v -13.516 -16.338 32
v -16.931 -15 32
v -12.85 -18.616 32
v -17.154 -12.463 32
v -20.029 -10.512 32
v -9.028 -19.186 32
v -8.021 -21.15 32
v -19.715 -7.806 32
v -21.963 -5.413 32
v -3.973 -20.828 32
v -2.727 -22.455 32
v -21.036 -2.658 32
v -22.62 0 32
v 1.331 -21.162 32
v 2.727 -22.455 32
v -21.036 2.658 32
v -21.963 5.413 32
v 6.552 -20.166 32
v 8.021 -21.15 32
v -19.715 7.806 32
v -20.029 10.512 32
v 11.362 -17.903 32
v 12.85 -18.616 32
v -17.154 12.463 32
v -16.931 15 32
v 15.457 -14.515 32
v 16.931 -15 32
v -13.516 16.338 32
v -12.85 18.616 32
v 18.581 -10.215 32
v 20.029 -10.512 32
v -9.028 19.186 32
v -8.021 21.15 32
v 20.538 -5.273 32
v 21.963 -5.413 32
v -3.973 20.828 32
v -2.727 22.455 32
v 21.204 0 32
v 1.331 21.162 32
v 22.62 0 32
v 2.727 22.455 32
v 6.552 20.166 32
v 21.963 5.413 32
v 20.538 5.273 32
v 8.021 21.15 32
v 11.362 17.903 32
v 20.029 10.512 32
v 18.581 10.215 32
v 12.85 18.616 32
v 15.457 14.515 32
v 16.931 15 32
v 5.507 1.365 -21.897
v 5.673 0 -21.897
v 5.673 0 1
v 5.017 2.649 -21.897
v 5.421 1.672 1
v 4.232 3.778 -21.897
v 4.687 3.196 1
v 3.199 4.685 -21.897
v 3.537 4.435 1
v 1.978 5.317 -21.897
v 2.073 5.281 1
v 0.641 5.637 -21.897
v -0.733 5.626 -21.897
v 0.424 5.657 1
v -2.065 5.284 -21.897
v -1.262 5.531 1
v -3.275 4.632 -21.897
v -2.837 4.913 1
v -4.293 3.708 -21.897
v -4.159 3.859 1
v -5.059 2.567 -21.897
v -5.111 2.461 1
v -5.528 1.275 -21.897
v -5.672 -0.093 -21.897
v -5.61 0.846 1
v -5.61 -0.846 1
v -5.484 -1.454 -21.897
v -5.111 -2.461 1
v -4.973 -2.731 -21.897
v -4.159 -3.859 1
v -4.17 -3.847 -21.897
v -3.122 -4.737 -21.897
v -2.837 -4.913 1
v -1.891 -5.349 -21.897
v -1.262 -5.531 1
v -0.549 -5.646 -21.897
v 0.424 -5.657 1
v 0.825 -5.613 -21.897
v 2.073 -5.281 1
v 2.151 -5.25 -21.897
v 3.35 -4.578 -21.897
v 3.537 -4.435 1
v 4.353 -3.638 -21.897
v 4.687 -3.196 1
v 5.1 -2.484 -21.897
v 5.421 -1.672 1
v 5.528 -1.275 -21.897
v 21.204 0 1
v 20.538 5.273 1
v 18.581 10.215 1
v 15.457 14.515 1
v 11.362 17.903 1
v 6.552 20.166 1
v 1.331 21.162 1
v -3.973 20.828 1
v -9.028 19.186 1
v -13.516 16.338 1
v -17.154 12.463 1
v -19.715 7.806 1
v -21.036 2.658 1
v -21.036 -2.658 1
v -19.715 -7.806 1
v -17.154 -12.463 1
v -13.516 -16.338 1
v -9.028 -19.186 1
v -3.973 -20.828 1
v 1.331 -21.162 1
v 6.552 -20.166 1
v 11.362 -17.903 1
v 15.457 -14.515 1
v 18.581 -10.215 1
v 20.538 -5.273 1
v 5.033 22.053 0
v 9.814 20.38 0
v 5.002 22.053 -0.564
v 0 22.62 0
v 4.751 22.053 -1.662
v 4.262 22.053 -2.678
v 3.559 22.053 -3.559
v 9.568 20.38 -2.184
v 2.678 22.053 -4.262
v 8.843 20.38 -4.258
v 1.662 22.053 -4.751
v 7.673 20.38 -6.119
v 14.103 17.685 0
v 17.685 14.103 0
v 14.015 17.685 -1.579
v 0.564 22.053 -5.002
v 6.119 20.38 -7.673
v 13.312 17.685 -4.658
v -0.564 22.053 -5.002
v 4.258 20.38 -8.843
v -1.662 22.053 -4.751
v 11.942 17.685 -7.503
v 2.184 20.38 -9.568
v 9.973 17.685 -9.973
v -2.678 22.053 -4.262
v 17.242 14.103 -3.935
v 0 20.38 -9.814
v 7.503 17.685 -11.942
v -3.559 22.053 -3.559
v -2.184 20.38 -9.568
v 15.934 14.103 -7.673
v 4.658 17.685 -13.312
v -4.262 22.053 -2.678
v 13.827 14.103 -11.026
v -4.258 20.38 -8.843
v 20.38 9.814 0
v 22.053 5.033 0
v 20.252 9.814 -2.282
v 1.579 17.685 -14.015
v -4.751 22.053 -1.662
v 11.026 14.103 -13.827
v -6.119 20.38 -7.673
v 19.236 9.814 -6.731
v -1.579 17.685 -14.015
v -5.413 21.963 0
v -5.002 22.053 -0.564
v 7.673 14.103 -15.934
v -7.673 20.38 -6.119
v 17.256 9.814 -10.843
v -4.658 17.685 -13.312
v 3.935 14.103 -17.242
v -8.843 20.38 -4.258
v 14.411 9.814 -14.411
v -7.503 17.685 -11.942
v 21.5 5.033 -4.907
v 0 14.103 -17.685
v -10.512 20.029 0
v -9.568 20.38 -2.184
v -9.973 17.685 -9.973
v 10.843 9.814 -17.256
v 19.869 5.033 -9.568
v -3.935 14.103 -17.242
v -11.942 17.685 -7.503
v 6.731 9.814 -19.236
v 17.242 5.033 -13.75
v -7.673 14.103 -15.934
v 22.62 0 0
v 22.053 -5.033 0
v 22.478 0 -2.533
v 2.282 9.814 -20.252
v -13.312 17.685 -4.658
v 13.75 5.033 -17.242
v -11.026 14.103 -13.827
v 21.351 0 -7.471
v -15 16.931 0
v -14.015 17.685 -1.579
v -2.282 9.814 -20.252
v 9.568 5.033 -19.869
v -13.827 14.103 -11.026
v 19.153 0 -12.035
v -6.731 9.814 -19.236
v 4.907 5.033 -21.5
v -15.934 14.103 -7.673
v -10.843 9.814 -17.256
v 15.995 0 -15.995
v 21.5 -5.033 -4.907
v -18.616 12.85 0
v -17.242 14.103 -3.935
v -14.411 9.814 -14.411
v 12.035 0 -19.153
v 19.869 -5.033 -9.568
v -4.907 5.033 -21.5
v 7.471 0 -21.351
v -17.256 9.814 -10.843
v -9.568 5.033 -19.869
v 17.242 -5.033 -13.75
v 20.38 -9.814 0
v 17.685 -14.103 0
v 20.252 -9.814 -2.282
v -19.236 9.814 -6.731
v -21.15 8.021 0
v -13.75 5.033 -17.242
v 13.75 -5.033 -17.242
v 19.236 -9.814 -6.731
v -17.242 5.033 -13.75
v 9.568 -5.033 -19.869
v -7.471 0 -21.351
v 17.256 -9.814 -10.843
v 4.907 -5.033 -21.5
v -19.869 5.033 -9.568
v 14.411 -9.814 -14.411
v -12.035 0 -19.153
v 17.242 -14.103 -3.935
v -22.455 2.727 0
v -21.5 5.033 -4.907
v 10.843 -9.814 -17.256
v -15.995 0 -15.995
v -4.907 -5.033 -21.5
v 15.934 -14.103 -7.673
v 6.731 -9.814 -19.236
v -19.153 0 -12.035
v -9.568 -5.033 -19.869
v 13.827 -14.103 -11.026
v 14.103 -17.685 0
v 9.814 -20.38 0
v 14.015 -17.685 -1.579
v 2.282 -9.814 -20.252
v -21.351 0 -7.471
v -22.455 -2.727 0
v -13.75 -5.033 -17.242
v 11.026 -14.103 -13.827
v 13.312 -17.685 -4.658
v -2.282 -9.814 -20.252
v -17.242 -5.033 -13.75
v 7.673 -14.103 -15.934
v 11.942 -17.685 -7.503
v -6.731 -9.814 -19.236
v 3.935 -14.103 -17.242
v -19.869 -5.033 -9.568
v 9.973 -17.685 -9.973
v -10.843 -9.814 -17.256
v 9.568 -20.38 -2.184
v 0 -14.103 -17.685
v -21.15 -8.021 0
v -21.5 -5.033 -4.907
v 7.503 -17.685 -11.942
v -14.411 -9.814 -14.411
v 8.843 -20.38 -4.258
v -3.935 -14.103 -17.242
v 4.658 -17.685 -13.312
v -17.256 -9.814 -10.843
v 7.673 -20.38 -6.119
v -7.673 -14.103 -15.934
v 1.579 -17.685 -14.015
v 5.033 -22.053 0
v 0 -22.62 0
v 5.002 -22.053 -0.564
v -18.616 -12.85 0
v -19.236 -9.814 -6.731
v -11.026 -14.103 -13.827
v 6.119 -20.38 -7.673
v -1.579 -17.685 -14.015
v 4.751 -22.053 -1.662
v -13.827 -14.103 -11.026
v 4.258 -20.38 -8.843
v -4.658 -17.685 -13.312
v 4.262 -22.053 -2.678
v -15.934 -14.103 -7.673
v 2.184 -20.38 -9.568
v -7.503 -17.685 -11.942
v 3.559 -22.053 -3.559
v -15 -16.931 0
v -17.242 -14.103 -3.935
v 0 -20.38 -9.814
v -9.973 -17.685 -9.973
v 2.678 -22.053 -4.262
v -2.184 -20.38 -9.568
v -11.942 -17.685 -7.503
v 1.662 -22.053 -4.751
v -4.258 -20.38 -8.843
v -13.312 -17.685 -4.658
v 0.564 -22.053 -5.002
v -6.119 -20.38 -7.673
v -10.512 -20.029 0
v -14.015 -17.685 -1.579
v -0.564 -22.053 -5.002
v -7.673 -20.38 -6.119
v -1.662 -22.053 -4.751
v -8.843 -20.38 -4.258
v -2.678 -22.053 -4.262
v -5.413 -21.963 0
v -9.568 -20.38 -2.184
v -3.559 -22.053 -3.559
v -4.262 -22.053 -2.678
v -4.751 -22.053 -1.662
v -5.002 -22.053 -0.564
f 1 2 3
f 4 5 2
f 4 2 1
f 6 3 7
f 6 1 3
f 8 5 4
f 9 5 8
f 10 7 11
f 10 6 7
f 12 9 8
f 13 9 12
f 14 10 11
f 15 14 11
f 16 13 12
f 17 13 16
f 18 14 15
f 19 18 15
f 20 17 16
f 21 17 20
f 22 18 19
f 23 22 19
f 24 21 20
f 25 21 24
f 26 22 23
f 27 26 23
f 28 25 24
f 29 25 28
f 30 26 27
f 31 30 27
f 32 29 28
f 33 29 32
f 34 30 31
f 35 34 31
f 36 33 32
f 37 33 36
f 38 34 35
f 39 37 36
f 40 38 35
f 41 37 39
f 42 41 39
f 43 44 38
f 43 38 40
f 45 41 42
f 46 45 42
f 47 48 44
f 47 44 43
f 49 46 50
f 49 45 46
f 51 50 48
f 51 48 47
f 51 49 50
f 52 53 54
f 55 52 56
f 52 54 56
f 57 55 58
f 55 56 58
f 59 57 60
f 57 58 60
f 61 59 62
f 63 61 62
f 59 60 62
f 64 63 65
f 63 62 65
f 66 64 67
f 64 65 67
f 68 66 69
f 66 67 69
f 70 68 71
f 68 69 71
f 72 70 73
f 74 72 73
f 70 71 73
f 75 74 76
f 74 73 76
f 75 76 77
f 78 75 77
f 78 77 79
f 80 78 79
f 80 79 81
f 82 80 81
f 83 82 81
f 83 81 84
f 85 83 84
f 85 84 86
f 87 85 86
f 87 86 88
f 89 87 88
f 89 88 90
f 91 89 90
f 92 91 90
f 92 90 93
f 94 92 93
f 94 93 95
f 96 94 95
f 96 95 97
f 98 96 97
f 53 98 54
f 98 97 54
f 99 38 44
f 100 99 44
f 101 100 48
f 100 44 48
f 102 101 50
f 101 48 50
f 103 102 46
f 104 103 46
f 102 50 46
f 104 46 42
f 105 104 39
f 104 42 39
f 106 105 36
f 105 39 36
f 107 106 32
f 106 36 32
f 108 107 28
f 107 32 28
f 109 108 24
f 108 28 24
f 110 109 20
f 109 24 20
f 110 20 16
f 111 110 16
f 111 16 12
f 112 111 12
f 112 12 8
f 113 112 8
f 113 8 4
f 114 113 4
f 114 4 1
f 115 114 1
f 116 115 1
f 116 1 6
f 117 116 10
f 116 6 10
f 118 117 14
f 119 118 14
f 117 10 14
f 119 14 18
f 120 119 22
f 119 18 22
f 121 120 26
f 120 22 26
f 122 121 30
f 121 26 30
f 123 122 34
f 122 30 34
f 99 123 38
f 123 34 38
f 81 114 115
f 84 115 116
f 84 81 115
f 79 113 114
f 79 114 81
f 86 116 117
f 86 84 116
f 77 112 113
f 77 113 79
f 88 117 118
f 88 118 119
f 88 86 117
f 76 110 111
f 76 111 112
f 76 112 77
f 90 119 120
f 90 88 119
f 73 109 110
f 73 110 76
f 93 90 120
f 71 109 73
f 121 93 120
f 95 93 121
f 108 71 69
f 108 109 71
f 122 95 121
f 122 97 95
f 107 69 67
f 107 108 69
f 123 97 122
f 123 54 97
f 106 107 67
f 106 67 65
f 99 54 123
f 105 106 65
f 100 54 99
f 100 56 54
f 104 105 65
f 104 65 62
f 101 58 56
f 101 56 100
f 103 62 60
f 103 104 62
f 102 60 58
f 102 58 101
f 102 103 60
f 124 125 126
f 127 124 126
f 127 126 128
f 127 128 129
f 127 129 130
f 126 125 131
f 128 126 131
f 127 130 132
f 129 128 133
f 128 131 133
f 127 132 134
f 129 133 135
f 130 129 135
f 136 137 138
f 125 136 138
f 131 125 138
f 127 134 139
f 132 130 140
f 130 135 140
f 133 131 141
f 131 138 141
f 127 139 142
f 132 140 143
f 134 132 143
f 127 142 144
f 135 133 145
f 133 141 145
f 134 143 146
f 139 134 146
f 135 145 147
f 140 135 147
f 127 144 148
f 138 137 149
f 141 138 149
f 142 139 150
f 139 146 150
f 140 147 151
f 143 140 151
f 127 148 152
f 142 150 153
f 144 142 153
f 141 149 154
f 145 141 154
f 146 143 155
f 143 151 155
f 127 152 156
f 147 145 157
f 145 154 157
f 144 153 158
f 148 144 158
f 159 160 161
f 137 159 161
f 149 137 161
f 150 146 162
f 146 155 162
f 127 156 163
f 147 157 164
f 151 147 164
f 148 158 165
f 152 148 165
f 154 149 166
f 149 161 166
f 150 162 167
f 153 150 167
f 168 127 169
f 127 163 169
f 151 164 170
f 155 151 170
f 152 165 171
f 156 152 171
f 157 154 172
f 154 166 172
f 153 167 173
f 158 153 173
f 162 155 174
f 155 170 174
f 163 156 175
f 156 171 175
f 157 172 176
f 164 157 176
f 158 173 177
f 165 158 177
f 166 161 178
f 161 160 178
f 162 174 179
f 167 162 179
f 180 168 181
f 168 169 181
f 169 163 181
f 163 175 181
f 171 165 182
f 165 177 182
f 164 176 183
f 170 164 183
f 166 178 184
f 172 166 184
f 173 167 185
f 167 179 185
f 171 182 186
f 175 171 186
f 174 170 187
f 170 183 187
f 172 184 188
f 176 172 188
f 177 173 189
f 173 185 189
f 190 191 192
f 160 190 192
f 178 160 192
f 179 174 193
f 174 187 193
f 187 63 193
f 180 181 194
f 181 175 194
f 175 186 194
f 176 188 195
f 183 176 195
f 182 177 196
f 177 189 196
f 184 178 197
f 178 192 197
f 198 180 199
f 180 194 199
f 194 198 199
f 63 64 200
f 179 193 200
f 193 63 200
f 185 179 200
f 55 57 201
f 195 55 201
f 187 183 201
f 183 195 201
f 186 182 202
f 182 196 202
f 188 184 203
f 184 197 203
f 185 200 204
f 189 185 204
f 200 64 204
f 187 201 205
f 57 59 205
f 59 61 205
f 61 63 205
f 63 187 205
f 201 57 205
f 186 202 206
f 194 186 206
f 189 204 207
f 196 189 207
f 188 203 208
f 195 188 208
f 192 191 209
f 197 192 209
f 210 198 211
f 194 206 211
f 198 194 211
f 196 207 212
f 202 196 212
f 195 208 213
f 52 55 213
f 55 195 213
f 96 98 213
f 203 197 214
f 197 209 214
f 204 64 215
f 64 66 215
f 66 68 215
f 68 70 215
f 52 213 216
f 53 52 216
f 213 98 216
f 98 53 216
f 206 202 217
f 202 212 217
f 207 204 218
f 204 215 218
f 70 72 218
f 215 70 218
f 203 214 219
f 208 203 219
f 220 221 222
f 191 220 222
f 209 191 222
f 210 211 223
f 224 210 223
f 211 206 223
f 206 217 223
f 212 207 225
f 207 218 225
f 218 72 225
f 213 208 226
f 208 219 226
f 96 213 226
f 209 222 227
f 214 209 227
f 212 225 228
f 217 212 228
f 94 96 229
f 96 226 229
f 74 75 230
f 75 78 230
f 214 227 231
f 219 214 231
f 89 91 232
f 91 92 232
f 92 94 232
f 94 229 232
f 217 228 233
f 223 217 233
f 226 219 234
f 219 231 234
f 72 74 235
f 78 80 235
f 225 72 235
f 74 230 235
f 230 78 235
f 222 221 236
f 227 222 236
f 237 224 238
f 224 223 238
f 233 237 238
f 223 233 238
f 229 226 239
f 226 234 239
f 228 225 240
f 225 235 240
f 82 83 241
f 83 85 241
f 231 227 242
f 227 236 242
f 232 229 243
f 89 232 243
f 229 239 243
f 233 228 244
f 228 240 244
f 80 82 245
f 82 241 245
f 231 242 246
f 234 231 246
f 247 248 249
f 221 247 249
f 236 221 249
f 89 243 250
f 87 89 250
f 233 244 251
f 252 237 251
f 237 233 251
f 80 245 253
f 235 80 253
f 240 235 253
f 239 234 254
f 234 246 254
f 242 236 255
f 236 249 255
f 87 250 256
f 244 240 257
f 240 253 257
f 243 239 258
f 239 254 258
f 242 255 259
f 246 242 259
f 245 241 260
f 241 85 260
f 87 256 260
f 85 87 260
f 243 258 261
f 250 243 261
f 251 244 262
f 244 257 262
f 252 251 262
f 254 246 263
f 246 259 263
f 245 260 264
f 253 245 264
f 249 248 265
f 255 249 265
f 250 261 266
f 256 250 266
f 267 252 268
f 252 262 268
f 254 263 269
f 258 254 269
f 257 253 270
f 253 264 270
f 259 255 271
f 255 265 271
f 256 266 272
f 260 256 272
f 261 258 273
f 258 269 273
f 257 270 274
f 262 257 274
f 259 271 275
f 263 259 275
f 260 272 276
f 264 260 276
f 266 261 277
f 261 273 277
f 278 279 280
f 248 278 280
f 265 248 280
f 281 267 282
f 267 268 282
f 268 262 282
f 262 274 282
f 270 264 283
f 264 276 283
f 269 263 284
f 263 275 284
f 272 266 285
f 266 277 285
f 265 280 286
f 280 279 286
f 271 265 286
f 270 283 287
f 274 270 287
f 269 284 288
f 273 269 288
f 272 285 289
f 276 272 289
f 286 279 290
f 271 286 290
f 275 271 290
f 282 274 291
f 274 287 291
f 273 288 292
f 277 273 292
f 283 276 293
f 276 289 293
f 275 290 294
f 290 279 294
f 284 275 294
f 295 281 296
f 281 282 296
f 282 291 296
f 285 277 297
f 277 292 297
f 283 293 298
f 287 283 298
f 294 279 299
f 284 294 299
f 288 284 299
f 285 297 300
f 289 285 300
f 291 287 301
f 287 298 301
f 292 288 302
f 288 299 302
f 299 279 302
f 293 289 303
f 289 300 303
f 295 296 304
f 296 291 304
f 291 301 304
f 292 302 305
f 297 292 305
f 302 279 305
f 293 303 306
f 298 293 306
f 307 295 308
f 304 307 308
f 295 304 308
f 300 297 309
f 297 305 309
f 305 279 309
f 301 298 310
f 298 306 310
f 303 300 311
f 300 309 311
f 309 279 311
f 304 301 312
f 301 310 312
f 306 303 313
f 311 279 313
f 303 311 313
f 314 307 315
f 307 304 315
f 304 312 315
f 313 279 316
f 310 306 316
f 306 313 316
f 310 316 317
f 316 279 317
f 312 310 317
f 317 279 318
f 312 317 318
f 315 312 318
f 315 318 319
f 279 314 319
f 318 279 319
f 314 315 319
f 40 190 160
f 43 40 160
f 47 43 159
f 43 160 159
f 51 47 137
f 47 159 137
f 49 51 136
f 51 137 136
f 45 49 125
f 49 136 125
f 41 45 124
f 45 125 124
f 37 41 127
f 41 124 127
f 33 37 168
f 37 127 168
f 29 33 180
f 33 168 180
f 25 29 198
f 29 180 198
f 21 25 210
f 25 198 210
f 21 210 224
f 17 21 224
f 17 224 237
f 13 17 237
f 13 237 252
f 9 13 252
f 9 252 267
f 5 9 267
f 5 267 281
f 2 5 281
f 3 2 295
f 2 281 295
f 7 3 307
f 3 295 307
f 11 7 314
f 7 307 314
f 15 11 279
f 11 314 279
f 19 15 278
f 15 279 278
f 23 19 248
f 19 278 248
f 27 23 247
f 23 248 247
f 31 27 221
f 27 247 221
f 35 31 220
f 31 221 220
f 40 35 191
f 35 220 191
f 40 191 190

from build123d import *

# Parameters (mm, degrees)
SKETCH1_R           = 22.62
BOSS_EXTRUDE1_DEPTH = 32
SKETCH3_R           = 5.673095137
CUT_EXTRUDE1_DEPTH  = 76
SKETCH5_R           = 21.203687462
CUT_EXTRUDE2_DEPTH  = 31


with BuildPart() as part:
    # Sketch1 → Boss-Extrude1 (new body)
    with BuildSketch(Plane.XY):
        Circle(SKETCH1_R)
    extrude(amount=BOSS_EXTRUDE1_DEPTH)

    # Sketch2 one side → Revolve1 (revolve)
    with BuildSketch(Plane(origin=(0, 0, 0), x_dir=(-1, 0, 0), z_dir=(0, 0, -1))):
        with BuildLine():
            ThreePointArc((0, 22.62), (-22.62, 0), (0, -22.62))
            Line((0, -22.62), (0, 0))
            Line((0, 0), (0, 22.62))
        make_face()
    revolve(axis=Axis((0, 0, 0), (0, 1, 0)))

    # Sketch3 → Cut-Extrude1 (cut)
    with BuildSketch(Plane.XY.offset(32)):
        Circle(SKETCH3_R)
    extrude(amount=-CUT_EXTRUDE1_DEPTH, mode=Mode.SUBTRACT)

    # Sketch5 → Cut-Extrude2 (cut)
    with BuildSketch(Plane.XY.offset(32)):
        Circle(SKETCH5_R)
    extrude(amount=-CUT_EXTRUDE2_DEPTH, mode=Mode.SUBTRACT)


solid = part.part
